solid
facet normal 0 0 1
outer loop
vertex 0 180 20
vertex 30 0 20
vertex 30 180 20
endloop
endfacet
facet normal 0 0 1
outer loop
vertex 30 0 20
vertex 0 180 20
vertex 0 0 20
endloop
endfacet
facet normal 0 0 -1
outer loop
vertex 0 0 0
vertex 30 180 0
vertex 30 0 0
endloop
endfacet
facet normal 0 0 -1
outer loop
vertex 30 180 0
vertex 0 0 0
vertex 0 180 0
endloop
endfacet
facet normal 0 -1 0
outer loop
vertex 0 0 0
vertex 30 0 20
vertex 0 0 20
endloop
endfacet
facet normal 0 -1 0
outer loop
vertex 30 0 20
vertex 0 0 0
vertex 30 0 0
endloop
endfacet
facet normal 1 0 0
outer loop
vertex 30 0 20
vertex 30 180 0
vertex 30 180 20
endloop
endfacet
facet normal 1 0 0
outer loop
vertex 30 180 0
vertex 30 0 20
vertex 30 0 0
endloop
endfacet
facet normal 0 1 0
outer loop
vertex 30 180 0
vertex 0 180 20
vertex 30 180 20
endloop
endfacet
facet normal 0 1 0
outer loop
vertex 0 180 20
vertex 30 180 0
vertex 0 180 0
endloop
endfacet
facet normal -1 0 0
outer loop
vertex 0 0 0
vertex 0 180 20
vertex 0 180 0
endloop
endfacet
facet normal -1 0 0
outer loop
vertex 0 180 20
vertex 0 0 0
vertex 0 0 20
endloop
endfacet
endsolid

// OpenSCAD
slot_width = 30;
slot_length = 180;
slot_length_skew = 20;
slot_depth = 20;

cube([slot_width, slot_length, slot_depth]);

polyhedron(points=[
  [0,0,0], // pt 0
  [0,0,slot_depth], // pt 1
  [slot_width,0,slot_depth], // pt 2
  [slot_width,0,0], // pt 3
  [], // pt 4
  [], // pt 5

], faces=[
]);
